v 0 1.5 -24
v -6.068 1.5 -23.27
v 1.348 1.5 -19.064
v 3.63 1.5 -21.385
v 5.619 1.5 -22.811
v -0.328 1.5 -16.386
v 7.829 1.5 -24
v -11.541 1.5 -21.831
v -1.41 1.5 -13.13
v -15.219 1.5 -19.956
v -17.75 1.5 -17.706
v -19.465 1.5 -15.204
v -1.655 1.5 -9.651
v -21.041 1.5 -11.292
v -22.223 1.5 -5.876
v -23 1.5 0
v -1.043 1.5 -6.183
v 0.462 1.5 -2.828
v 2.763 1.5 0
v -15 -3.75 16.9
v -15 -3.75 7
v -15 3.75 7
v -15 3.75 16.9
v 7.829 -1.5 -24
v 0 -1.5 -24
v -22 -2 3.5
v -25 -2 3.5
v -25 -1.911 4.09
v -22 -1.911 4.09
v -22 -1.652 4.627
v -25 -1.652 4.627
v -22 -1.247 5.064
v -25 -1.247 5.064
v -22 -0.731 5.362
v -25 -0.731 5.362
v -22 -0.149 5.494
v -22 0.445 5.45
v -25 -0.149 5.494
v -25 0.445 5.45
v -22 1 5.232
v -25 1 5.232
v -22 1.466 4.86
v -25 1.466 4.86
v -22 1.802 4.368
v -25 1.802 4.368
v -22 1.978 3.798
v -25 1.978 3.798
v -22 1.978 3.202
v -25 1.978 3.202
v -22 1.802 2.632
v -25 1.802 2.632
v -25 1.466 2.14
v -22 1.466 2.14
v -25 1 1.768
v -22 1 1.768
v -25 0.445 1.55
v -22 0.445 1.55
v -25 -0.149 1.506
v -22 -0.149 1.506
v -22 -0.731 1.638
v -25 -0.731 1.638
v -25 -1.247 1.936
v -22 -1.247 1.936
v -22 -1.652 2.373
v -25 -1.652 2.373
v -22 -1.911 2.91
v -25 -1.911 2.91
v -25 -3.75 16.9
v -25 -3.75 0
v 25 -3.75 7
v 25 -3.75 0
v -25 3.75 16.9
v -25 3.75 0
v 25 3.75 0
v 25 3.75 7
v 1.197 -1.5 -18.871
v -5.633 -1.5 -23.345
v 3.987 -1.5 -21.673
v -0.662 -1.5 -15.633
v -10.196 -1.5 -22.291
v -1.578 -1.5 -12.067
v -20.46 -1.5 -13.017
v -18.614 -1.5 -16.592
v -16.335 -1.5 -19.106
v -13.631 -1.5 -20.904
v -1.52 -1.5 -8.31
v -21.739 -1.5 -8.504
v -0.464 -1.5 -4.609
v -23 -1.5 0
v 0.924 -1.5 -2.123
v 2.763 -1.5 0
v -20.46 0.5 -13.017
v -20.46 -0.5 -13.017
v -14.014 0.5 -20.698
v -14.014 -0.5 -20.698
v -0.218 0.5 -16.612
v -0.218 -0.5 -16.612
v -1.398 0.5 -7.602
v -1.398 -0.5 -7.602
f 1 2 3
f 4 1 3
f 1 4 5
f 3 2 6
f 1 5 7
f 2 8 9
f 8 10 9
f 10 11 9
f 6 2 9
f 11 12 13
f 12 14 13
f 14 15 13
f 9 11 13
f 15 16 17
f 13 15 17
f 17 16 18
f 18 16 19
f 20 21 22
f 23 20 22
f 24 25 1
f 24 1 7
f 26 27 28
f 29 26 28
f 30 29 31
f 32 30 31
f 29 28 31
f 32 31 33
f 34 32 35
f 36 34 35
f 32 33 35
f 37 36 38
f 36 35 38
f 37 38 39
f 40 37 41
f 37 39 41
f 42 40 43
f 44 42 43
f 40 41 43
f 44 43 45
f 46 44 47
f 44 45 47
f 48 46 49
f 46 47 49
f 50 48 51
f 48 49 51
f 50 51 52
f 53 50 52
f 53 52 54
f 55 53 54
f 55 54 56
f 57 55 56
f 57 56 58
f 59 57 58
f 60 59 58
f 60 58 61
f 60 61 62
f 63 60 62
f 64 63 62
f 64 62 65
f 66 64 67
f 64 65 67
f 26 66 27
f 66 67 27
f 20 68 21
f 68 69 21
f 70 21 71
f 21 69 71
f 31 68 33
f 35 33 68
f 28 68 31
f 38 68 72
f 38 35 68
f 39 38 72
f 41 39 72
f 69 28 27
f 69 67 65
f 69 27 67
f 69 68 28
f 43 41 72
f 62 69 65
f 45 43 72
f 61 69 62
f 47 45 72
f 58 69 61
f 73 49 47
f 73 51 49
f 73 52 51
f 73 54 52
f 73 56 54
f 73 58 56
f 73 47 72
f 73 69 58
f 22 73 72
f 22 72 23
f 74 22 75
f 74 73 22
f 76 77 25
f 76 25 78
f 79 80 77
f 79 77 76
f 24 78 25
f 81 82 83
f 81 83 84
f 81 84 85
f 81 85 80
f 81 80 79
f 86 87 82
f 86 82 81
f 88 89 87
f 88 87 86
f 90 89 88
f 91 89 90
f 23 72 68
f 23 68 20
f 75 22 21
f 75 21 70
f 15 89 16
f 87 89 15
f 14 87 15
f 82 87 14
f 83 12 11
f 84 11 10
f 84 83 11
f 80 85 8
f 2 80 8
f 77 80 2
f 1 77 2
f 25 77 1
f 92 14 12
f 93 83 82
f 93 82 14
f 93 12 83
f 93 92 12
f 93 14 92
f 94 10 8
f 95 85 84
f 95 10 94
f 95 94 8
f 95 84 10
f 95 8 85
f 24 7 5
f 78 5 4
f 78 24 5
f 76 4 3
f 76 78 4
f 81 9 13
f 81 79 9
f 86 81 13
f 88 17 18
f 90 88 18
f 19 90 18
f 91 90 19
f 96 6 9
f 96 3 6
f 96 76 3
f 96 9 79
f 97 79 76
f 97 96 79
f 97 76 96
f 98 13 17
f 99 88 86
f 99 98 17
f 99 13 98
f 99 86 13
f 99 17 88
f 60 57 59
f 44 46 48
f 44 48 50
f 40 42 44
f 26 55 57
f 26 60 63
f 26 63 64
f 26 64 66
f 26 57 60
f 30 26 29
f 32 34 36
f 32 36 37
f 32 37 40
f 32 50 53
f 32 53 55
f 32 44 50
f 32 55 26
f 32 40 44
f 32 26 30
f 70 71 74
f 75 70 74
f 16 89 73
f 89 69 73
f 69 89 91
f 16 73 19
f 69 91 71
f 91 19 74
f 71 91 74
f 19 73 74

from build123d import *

# Parameters (mm, degrees)
F0_W     = 50
F0_H     = 7.5
F1_DEPTH = 7
F2_W     = 38
F2_H     = 3
F3_DEPTH = 24
F5_DEPTH = 25
F6_R     = 2
F7_DEPTH = 3
F8_W     = 10
F8_H     = 7.5
F9_DEPTH = 9.9


with BuildPart() as f1:
    # F0 (on Top) → F1 (new body)
    with BuildSketch(Plane.XY):
        Rectangle(F0_W, F0_H)
    extrude(amount=F1_DEPTH)

    # F2 (on face) → F3 (join)
    with BuildSketch(Plane(origin=(0, 0, 0), x_dir=(1, 0, 0), z_dir=(0, 0, -1))):
        with Locations((-4, 0)):
            Rectangle(F2_W, F2_H)
    extrude(amount=F3_DEPTH)

    # F4 (on face) → F5 (cut)
    with BuildSketch(Plane.XZ.offset(1.5)):
        with BuildLine():
            add(Edge.make_bspline(
                [(-23, 0), (-21.1907899678, -16.0032901913), (-19.0204773098, -22.5683785975), (0, -24)],
                knots=[0, 0, 0, 0, 33.2415402772, 33.2415402772, 33.2415402772, 33.2415402772], degree=3))
            Line((-23, 0), (-23, -24))
            Line((-23, -24), (0, -24))
        make_face()
        with BuildLine():
            Line((15, 0), (2.7631570119, 0))
            add(Edge.make_bspline(
                [(7.8289462253, -24), (-4.1600125842, -18.4321980923), (-3.5605092999, -5.8886152692), (2.7631570119, 0)],
                knots=[0, 0, 0, 0, 24.5288038916, 24.5288038916, 24.5288038916, 24.5288038916], degree=3))
            Line((7.8289462253, -24), (15, -24))
            Line((15, -24), (15, 0))
        make_face()
    extrude(amount=-F5_DEPTH, mode=Mode.SUBTRACT)

    # F6 (on face) → F7 (cut)
    with BuildSketch(Plane(origin=(-25, 0, 0), x_dir=(0, -1, 0), z_dir=(-1, 0, 0))):
        with Locations((0, 3.5)):
            Circle(F6_R)
    extrude(amount=-F7_DEPTH, mode=Mode.SUBTRACT)

    # F8 (on face) → F9 (join)
    with BuildSketch(Plane.XY.offset(7)):
        with Locations((-20, 0)):
            Rectangle(F8_W, F8_H)
    extrude(amount=F9_DEPTH)


solid = f1.part
